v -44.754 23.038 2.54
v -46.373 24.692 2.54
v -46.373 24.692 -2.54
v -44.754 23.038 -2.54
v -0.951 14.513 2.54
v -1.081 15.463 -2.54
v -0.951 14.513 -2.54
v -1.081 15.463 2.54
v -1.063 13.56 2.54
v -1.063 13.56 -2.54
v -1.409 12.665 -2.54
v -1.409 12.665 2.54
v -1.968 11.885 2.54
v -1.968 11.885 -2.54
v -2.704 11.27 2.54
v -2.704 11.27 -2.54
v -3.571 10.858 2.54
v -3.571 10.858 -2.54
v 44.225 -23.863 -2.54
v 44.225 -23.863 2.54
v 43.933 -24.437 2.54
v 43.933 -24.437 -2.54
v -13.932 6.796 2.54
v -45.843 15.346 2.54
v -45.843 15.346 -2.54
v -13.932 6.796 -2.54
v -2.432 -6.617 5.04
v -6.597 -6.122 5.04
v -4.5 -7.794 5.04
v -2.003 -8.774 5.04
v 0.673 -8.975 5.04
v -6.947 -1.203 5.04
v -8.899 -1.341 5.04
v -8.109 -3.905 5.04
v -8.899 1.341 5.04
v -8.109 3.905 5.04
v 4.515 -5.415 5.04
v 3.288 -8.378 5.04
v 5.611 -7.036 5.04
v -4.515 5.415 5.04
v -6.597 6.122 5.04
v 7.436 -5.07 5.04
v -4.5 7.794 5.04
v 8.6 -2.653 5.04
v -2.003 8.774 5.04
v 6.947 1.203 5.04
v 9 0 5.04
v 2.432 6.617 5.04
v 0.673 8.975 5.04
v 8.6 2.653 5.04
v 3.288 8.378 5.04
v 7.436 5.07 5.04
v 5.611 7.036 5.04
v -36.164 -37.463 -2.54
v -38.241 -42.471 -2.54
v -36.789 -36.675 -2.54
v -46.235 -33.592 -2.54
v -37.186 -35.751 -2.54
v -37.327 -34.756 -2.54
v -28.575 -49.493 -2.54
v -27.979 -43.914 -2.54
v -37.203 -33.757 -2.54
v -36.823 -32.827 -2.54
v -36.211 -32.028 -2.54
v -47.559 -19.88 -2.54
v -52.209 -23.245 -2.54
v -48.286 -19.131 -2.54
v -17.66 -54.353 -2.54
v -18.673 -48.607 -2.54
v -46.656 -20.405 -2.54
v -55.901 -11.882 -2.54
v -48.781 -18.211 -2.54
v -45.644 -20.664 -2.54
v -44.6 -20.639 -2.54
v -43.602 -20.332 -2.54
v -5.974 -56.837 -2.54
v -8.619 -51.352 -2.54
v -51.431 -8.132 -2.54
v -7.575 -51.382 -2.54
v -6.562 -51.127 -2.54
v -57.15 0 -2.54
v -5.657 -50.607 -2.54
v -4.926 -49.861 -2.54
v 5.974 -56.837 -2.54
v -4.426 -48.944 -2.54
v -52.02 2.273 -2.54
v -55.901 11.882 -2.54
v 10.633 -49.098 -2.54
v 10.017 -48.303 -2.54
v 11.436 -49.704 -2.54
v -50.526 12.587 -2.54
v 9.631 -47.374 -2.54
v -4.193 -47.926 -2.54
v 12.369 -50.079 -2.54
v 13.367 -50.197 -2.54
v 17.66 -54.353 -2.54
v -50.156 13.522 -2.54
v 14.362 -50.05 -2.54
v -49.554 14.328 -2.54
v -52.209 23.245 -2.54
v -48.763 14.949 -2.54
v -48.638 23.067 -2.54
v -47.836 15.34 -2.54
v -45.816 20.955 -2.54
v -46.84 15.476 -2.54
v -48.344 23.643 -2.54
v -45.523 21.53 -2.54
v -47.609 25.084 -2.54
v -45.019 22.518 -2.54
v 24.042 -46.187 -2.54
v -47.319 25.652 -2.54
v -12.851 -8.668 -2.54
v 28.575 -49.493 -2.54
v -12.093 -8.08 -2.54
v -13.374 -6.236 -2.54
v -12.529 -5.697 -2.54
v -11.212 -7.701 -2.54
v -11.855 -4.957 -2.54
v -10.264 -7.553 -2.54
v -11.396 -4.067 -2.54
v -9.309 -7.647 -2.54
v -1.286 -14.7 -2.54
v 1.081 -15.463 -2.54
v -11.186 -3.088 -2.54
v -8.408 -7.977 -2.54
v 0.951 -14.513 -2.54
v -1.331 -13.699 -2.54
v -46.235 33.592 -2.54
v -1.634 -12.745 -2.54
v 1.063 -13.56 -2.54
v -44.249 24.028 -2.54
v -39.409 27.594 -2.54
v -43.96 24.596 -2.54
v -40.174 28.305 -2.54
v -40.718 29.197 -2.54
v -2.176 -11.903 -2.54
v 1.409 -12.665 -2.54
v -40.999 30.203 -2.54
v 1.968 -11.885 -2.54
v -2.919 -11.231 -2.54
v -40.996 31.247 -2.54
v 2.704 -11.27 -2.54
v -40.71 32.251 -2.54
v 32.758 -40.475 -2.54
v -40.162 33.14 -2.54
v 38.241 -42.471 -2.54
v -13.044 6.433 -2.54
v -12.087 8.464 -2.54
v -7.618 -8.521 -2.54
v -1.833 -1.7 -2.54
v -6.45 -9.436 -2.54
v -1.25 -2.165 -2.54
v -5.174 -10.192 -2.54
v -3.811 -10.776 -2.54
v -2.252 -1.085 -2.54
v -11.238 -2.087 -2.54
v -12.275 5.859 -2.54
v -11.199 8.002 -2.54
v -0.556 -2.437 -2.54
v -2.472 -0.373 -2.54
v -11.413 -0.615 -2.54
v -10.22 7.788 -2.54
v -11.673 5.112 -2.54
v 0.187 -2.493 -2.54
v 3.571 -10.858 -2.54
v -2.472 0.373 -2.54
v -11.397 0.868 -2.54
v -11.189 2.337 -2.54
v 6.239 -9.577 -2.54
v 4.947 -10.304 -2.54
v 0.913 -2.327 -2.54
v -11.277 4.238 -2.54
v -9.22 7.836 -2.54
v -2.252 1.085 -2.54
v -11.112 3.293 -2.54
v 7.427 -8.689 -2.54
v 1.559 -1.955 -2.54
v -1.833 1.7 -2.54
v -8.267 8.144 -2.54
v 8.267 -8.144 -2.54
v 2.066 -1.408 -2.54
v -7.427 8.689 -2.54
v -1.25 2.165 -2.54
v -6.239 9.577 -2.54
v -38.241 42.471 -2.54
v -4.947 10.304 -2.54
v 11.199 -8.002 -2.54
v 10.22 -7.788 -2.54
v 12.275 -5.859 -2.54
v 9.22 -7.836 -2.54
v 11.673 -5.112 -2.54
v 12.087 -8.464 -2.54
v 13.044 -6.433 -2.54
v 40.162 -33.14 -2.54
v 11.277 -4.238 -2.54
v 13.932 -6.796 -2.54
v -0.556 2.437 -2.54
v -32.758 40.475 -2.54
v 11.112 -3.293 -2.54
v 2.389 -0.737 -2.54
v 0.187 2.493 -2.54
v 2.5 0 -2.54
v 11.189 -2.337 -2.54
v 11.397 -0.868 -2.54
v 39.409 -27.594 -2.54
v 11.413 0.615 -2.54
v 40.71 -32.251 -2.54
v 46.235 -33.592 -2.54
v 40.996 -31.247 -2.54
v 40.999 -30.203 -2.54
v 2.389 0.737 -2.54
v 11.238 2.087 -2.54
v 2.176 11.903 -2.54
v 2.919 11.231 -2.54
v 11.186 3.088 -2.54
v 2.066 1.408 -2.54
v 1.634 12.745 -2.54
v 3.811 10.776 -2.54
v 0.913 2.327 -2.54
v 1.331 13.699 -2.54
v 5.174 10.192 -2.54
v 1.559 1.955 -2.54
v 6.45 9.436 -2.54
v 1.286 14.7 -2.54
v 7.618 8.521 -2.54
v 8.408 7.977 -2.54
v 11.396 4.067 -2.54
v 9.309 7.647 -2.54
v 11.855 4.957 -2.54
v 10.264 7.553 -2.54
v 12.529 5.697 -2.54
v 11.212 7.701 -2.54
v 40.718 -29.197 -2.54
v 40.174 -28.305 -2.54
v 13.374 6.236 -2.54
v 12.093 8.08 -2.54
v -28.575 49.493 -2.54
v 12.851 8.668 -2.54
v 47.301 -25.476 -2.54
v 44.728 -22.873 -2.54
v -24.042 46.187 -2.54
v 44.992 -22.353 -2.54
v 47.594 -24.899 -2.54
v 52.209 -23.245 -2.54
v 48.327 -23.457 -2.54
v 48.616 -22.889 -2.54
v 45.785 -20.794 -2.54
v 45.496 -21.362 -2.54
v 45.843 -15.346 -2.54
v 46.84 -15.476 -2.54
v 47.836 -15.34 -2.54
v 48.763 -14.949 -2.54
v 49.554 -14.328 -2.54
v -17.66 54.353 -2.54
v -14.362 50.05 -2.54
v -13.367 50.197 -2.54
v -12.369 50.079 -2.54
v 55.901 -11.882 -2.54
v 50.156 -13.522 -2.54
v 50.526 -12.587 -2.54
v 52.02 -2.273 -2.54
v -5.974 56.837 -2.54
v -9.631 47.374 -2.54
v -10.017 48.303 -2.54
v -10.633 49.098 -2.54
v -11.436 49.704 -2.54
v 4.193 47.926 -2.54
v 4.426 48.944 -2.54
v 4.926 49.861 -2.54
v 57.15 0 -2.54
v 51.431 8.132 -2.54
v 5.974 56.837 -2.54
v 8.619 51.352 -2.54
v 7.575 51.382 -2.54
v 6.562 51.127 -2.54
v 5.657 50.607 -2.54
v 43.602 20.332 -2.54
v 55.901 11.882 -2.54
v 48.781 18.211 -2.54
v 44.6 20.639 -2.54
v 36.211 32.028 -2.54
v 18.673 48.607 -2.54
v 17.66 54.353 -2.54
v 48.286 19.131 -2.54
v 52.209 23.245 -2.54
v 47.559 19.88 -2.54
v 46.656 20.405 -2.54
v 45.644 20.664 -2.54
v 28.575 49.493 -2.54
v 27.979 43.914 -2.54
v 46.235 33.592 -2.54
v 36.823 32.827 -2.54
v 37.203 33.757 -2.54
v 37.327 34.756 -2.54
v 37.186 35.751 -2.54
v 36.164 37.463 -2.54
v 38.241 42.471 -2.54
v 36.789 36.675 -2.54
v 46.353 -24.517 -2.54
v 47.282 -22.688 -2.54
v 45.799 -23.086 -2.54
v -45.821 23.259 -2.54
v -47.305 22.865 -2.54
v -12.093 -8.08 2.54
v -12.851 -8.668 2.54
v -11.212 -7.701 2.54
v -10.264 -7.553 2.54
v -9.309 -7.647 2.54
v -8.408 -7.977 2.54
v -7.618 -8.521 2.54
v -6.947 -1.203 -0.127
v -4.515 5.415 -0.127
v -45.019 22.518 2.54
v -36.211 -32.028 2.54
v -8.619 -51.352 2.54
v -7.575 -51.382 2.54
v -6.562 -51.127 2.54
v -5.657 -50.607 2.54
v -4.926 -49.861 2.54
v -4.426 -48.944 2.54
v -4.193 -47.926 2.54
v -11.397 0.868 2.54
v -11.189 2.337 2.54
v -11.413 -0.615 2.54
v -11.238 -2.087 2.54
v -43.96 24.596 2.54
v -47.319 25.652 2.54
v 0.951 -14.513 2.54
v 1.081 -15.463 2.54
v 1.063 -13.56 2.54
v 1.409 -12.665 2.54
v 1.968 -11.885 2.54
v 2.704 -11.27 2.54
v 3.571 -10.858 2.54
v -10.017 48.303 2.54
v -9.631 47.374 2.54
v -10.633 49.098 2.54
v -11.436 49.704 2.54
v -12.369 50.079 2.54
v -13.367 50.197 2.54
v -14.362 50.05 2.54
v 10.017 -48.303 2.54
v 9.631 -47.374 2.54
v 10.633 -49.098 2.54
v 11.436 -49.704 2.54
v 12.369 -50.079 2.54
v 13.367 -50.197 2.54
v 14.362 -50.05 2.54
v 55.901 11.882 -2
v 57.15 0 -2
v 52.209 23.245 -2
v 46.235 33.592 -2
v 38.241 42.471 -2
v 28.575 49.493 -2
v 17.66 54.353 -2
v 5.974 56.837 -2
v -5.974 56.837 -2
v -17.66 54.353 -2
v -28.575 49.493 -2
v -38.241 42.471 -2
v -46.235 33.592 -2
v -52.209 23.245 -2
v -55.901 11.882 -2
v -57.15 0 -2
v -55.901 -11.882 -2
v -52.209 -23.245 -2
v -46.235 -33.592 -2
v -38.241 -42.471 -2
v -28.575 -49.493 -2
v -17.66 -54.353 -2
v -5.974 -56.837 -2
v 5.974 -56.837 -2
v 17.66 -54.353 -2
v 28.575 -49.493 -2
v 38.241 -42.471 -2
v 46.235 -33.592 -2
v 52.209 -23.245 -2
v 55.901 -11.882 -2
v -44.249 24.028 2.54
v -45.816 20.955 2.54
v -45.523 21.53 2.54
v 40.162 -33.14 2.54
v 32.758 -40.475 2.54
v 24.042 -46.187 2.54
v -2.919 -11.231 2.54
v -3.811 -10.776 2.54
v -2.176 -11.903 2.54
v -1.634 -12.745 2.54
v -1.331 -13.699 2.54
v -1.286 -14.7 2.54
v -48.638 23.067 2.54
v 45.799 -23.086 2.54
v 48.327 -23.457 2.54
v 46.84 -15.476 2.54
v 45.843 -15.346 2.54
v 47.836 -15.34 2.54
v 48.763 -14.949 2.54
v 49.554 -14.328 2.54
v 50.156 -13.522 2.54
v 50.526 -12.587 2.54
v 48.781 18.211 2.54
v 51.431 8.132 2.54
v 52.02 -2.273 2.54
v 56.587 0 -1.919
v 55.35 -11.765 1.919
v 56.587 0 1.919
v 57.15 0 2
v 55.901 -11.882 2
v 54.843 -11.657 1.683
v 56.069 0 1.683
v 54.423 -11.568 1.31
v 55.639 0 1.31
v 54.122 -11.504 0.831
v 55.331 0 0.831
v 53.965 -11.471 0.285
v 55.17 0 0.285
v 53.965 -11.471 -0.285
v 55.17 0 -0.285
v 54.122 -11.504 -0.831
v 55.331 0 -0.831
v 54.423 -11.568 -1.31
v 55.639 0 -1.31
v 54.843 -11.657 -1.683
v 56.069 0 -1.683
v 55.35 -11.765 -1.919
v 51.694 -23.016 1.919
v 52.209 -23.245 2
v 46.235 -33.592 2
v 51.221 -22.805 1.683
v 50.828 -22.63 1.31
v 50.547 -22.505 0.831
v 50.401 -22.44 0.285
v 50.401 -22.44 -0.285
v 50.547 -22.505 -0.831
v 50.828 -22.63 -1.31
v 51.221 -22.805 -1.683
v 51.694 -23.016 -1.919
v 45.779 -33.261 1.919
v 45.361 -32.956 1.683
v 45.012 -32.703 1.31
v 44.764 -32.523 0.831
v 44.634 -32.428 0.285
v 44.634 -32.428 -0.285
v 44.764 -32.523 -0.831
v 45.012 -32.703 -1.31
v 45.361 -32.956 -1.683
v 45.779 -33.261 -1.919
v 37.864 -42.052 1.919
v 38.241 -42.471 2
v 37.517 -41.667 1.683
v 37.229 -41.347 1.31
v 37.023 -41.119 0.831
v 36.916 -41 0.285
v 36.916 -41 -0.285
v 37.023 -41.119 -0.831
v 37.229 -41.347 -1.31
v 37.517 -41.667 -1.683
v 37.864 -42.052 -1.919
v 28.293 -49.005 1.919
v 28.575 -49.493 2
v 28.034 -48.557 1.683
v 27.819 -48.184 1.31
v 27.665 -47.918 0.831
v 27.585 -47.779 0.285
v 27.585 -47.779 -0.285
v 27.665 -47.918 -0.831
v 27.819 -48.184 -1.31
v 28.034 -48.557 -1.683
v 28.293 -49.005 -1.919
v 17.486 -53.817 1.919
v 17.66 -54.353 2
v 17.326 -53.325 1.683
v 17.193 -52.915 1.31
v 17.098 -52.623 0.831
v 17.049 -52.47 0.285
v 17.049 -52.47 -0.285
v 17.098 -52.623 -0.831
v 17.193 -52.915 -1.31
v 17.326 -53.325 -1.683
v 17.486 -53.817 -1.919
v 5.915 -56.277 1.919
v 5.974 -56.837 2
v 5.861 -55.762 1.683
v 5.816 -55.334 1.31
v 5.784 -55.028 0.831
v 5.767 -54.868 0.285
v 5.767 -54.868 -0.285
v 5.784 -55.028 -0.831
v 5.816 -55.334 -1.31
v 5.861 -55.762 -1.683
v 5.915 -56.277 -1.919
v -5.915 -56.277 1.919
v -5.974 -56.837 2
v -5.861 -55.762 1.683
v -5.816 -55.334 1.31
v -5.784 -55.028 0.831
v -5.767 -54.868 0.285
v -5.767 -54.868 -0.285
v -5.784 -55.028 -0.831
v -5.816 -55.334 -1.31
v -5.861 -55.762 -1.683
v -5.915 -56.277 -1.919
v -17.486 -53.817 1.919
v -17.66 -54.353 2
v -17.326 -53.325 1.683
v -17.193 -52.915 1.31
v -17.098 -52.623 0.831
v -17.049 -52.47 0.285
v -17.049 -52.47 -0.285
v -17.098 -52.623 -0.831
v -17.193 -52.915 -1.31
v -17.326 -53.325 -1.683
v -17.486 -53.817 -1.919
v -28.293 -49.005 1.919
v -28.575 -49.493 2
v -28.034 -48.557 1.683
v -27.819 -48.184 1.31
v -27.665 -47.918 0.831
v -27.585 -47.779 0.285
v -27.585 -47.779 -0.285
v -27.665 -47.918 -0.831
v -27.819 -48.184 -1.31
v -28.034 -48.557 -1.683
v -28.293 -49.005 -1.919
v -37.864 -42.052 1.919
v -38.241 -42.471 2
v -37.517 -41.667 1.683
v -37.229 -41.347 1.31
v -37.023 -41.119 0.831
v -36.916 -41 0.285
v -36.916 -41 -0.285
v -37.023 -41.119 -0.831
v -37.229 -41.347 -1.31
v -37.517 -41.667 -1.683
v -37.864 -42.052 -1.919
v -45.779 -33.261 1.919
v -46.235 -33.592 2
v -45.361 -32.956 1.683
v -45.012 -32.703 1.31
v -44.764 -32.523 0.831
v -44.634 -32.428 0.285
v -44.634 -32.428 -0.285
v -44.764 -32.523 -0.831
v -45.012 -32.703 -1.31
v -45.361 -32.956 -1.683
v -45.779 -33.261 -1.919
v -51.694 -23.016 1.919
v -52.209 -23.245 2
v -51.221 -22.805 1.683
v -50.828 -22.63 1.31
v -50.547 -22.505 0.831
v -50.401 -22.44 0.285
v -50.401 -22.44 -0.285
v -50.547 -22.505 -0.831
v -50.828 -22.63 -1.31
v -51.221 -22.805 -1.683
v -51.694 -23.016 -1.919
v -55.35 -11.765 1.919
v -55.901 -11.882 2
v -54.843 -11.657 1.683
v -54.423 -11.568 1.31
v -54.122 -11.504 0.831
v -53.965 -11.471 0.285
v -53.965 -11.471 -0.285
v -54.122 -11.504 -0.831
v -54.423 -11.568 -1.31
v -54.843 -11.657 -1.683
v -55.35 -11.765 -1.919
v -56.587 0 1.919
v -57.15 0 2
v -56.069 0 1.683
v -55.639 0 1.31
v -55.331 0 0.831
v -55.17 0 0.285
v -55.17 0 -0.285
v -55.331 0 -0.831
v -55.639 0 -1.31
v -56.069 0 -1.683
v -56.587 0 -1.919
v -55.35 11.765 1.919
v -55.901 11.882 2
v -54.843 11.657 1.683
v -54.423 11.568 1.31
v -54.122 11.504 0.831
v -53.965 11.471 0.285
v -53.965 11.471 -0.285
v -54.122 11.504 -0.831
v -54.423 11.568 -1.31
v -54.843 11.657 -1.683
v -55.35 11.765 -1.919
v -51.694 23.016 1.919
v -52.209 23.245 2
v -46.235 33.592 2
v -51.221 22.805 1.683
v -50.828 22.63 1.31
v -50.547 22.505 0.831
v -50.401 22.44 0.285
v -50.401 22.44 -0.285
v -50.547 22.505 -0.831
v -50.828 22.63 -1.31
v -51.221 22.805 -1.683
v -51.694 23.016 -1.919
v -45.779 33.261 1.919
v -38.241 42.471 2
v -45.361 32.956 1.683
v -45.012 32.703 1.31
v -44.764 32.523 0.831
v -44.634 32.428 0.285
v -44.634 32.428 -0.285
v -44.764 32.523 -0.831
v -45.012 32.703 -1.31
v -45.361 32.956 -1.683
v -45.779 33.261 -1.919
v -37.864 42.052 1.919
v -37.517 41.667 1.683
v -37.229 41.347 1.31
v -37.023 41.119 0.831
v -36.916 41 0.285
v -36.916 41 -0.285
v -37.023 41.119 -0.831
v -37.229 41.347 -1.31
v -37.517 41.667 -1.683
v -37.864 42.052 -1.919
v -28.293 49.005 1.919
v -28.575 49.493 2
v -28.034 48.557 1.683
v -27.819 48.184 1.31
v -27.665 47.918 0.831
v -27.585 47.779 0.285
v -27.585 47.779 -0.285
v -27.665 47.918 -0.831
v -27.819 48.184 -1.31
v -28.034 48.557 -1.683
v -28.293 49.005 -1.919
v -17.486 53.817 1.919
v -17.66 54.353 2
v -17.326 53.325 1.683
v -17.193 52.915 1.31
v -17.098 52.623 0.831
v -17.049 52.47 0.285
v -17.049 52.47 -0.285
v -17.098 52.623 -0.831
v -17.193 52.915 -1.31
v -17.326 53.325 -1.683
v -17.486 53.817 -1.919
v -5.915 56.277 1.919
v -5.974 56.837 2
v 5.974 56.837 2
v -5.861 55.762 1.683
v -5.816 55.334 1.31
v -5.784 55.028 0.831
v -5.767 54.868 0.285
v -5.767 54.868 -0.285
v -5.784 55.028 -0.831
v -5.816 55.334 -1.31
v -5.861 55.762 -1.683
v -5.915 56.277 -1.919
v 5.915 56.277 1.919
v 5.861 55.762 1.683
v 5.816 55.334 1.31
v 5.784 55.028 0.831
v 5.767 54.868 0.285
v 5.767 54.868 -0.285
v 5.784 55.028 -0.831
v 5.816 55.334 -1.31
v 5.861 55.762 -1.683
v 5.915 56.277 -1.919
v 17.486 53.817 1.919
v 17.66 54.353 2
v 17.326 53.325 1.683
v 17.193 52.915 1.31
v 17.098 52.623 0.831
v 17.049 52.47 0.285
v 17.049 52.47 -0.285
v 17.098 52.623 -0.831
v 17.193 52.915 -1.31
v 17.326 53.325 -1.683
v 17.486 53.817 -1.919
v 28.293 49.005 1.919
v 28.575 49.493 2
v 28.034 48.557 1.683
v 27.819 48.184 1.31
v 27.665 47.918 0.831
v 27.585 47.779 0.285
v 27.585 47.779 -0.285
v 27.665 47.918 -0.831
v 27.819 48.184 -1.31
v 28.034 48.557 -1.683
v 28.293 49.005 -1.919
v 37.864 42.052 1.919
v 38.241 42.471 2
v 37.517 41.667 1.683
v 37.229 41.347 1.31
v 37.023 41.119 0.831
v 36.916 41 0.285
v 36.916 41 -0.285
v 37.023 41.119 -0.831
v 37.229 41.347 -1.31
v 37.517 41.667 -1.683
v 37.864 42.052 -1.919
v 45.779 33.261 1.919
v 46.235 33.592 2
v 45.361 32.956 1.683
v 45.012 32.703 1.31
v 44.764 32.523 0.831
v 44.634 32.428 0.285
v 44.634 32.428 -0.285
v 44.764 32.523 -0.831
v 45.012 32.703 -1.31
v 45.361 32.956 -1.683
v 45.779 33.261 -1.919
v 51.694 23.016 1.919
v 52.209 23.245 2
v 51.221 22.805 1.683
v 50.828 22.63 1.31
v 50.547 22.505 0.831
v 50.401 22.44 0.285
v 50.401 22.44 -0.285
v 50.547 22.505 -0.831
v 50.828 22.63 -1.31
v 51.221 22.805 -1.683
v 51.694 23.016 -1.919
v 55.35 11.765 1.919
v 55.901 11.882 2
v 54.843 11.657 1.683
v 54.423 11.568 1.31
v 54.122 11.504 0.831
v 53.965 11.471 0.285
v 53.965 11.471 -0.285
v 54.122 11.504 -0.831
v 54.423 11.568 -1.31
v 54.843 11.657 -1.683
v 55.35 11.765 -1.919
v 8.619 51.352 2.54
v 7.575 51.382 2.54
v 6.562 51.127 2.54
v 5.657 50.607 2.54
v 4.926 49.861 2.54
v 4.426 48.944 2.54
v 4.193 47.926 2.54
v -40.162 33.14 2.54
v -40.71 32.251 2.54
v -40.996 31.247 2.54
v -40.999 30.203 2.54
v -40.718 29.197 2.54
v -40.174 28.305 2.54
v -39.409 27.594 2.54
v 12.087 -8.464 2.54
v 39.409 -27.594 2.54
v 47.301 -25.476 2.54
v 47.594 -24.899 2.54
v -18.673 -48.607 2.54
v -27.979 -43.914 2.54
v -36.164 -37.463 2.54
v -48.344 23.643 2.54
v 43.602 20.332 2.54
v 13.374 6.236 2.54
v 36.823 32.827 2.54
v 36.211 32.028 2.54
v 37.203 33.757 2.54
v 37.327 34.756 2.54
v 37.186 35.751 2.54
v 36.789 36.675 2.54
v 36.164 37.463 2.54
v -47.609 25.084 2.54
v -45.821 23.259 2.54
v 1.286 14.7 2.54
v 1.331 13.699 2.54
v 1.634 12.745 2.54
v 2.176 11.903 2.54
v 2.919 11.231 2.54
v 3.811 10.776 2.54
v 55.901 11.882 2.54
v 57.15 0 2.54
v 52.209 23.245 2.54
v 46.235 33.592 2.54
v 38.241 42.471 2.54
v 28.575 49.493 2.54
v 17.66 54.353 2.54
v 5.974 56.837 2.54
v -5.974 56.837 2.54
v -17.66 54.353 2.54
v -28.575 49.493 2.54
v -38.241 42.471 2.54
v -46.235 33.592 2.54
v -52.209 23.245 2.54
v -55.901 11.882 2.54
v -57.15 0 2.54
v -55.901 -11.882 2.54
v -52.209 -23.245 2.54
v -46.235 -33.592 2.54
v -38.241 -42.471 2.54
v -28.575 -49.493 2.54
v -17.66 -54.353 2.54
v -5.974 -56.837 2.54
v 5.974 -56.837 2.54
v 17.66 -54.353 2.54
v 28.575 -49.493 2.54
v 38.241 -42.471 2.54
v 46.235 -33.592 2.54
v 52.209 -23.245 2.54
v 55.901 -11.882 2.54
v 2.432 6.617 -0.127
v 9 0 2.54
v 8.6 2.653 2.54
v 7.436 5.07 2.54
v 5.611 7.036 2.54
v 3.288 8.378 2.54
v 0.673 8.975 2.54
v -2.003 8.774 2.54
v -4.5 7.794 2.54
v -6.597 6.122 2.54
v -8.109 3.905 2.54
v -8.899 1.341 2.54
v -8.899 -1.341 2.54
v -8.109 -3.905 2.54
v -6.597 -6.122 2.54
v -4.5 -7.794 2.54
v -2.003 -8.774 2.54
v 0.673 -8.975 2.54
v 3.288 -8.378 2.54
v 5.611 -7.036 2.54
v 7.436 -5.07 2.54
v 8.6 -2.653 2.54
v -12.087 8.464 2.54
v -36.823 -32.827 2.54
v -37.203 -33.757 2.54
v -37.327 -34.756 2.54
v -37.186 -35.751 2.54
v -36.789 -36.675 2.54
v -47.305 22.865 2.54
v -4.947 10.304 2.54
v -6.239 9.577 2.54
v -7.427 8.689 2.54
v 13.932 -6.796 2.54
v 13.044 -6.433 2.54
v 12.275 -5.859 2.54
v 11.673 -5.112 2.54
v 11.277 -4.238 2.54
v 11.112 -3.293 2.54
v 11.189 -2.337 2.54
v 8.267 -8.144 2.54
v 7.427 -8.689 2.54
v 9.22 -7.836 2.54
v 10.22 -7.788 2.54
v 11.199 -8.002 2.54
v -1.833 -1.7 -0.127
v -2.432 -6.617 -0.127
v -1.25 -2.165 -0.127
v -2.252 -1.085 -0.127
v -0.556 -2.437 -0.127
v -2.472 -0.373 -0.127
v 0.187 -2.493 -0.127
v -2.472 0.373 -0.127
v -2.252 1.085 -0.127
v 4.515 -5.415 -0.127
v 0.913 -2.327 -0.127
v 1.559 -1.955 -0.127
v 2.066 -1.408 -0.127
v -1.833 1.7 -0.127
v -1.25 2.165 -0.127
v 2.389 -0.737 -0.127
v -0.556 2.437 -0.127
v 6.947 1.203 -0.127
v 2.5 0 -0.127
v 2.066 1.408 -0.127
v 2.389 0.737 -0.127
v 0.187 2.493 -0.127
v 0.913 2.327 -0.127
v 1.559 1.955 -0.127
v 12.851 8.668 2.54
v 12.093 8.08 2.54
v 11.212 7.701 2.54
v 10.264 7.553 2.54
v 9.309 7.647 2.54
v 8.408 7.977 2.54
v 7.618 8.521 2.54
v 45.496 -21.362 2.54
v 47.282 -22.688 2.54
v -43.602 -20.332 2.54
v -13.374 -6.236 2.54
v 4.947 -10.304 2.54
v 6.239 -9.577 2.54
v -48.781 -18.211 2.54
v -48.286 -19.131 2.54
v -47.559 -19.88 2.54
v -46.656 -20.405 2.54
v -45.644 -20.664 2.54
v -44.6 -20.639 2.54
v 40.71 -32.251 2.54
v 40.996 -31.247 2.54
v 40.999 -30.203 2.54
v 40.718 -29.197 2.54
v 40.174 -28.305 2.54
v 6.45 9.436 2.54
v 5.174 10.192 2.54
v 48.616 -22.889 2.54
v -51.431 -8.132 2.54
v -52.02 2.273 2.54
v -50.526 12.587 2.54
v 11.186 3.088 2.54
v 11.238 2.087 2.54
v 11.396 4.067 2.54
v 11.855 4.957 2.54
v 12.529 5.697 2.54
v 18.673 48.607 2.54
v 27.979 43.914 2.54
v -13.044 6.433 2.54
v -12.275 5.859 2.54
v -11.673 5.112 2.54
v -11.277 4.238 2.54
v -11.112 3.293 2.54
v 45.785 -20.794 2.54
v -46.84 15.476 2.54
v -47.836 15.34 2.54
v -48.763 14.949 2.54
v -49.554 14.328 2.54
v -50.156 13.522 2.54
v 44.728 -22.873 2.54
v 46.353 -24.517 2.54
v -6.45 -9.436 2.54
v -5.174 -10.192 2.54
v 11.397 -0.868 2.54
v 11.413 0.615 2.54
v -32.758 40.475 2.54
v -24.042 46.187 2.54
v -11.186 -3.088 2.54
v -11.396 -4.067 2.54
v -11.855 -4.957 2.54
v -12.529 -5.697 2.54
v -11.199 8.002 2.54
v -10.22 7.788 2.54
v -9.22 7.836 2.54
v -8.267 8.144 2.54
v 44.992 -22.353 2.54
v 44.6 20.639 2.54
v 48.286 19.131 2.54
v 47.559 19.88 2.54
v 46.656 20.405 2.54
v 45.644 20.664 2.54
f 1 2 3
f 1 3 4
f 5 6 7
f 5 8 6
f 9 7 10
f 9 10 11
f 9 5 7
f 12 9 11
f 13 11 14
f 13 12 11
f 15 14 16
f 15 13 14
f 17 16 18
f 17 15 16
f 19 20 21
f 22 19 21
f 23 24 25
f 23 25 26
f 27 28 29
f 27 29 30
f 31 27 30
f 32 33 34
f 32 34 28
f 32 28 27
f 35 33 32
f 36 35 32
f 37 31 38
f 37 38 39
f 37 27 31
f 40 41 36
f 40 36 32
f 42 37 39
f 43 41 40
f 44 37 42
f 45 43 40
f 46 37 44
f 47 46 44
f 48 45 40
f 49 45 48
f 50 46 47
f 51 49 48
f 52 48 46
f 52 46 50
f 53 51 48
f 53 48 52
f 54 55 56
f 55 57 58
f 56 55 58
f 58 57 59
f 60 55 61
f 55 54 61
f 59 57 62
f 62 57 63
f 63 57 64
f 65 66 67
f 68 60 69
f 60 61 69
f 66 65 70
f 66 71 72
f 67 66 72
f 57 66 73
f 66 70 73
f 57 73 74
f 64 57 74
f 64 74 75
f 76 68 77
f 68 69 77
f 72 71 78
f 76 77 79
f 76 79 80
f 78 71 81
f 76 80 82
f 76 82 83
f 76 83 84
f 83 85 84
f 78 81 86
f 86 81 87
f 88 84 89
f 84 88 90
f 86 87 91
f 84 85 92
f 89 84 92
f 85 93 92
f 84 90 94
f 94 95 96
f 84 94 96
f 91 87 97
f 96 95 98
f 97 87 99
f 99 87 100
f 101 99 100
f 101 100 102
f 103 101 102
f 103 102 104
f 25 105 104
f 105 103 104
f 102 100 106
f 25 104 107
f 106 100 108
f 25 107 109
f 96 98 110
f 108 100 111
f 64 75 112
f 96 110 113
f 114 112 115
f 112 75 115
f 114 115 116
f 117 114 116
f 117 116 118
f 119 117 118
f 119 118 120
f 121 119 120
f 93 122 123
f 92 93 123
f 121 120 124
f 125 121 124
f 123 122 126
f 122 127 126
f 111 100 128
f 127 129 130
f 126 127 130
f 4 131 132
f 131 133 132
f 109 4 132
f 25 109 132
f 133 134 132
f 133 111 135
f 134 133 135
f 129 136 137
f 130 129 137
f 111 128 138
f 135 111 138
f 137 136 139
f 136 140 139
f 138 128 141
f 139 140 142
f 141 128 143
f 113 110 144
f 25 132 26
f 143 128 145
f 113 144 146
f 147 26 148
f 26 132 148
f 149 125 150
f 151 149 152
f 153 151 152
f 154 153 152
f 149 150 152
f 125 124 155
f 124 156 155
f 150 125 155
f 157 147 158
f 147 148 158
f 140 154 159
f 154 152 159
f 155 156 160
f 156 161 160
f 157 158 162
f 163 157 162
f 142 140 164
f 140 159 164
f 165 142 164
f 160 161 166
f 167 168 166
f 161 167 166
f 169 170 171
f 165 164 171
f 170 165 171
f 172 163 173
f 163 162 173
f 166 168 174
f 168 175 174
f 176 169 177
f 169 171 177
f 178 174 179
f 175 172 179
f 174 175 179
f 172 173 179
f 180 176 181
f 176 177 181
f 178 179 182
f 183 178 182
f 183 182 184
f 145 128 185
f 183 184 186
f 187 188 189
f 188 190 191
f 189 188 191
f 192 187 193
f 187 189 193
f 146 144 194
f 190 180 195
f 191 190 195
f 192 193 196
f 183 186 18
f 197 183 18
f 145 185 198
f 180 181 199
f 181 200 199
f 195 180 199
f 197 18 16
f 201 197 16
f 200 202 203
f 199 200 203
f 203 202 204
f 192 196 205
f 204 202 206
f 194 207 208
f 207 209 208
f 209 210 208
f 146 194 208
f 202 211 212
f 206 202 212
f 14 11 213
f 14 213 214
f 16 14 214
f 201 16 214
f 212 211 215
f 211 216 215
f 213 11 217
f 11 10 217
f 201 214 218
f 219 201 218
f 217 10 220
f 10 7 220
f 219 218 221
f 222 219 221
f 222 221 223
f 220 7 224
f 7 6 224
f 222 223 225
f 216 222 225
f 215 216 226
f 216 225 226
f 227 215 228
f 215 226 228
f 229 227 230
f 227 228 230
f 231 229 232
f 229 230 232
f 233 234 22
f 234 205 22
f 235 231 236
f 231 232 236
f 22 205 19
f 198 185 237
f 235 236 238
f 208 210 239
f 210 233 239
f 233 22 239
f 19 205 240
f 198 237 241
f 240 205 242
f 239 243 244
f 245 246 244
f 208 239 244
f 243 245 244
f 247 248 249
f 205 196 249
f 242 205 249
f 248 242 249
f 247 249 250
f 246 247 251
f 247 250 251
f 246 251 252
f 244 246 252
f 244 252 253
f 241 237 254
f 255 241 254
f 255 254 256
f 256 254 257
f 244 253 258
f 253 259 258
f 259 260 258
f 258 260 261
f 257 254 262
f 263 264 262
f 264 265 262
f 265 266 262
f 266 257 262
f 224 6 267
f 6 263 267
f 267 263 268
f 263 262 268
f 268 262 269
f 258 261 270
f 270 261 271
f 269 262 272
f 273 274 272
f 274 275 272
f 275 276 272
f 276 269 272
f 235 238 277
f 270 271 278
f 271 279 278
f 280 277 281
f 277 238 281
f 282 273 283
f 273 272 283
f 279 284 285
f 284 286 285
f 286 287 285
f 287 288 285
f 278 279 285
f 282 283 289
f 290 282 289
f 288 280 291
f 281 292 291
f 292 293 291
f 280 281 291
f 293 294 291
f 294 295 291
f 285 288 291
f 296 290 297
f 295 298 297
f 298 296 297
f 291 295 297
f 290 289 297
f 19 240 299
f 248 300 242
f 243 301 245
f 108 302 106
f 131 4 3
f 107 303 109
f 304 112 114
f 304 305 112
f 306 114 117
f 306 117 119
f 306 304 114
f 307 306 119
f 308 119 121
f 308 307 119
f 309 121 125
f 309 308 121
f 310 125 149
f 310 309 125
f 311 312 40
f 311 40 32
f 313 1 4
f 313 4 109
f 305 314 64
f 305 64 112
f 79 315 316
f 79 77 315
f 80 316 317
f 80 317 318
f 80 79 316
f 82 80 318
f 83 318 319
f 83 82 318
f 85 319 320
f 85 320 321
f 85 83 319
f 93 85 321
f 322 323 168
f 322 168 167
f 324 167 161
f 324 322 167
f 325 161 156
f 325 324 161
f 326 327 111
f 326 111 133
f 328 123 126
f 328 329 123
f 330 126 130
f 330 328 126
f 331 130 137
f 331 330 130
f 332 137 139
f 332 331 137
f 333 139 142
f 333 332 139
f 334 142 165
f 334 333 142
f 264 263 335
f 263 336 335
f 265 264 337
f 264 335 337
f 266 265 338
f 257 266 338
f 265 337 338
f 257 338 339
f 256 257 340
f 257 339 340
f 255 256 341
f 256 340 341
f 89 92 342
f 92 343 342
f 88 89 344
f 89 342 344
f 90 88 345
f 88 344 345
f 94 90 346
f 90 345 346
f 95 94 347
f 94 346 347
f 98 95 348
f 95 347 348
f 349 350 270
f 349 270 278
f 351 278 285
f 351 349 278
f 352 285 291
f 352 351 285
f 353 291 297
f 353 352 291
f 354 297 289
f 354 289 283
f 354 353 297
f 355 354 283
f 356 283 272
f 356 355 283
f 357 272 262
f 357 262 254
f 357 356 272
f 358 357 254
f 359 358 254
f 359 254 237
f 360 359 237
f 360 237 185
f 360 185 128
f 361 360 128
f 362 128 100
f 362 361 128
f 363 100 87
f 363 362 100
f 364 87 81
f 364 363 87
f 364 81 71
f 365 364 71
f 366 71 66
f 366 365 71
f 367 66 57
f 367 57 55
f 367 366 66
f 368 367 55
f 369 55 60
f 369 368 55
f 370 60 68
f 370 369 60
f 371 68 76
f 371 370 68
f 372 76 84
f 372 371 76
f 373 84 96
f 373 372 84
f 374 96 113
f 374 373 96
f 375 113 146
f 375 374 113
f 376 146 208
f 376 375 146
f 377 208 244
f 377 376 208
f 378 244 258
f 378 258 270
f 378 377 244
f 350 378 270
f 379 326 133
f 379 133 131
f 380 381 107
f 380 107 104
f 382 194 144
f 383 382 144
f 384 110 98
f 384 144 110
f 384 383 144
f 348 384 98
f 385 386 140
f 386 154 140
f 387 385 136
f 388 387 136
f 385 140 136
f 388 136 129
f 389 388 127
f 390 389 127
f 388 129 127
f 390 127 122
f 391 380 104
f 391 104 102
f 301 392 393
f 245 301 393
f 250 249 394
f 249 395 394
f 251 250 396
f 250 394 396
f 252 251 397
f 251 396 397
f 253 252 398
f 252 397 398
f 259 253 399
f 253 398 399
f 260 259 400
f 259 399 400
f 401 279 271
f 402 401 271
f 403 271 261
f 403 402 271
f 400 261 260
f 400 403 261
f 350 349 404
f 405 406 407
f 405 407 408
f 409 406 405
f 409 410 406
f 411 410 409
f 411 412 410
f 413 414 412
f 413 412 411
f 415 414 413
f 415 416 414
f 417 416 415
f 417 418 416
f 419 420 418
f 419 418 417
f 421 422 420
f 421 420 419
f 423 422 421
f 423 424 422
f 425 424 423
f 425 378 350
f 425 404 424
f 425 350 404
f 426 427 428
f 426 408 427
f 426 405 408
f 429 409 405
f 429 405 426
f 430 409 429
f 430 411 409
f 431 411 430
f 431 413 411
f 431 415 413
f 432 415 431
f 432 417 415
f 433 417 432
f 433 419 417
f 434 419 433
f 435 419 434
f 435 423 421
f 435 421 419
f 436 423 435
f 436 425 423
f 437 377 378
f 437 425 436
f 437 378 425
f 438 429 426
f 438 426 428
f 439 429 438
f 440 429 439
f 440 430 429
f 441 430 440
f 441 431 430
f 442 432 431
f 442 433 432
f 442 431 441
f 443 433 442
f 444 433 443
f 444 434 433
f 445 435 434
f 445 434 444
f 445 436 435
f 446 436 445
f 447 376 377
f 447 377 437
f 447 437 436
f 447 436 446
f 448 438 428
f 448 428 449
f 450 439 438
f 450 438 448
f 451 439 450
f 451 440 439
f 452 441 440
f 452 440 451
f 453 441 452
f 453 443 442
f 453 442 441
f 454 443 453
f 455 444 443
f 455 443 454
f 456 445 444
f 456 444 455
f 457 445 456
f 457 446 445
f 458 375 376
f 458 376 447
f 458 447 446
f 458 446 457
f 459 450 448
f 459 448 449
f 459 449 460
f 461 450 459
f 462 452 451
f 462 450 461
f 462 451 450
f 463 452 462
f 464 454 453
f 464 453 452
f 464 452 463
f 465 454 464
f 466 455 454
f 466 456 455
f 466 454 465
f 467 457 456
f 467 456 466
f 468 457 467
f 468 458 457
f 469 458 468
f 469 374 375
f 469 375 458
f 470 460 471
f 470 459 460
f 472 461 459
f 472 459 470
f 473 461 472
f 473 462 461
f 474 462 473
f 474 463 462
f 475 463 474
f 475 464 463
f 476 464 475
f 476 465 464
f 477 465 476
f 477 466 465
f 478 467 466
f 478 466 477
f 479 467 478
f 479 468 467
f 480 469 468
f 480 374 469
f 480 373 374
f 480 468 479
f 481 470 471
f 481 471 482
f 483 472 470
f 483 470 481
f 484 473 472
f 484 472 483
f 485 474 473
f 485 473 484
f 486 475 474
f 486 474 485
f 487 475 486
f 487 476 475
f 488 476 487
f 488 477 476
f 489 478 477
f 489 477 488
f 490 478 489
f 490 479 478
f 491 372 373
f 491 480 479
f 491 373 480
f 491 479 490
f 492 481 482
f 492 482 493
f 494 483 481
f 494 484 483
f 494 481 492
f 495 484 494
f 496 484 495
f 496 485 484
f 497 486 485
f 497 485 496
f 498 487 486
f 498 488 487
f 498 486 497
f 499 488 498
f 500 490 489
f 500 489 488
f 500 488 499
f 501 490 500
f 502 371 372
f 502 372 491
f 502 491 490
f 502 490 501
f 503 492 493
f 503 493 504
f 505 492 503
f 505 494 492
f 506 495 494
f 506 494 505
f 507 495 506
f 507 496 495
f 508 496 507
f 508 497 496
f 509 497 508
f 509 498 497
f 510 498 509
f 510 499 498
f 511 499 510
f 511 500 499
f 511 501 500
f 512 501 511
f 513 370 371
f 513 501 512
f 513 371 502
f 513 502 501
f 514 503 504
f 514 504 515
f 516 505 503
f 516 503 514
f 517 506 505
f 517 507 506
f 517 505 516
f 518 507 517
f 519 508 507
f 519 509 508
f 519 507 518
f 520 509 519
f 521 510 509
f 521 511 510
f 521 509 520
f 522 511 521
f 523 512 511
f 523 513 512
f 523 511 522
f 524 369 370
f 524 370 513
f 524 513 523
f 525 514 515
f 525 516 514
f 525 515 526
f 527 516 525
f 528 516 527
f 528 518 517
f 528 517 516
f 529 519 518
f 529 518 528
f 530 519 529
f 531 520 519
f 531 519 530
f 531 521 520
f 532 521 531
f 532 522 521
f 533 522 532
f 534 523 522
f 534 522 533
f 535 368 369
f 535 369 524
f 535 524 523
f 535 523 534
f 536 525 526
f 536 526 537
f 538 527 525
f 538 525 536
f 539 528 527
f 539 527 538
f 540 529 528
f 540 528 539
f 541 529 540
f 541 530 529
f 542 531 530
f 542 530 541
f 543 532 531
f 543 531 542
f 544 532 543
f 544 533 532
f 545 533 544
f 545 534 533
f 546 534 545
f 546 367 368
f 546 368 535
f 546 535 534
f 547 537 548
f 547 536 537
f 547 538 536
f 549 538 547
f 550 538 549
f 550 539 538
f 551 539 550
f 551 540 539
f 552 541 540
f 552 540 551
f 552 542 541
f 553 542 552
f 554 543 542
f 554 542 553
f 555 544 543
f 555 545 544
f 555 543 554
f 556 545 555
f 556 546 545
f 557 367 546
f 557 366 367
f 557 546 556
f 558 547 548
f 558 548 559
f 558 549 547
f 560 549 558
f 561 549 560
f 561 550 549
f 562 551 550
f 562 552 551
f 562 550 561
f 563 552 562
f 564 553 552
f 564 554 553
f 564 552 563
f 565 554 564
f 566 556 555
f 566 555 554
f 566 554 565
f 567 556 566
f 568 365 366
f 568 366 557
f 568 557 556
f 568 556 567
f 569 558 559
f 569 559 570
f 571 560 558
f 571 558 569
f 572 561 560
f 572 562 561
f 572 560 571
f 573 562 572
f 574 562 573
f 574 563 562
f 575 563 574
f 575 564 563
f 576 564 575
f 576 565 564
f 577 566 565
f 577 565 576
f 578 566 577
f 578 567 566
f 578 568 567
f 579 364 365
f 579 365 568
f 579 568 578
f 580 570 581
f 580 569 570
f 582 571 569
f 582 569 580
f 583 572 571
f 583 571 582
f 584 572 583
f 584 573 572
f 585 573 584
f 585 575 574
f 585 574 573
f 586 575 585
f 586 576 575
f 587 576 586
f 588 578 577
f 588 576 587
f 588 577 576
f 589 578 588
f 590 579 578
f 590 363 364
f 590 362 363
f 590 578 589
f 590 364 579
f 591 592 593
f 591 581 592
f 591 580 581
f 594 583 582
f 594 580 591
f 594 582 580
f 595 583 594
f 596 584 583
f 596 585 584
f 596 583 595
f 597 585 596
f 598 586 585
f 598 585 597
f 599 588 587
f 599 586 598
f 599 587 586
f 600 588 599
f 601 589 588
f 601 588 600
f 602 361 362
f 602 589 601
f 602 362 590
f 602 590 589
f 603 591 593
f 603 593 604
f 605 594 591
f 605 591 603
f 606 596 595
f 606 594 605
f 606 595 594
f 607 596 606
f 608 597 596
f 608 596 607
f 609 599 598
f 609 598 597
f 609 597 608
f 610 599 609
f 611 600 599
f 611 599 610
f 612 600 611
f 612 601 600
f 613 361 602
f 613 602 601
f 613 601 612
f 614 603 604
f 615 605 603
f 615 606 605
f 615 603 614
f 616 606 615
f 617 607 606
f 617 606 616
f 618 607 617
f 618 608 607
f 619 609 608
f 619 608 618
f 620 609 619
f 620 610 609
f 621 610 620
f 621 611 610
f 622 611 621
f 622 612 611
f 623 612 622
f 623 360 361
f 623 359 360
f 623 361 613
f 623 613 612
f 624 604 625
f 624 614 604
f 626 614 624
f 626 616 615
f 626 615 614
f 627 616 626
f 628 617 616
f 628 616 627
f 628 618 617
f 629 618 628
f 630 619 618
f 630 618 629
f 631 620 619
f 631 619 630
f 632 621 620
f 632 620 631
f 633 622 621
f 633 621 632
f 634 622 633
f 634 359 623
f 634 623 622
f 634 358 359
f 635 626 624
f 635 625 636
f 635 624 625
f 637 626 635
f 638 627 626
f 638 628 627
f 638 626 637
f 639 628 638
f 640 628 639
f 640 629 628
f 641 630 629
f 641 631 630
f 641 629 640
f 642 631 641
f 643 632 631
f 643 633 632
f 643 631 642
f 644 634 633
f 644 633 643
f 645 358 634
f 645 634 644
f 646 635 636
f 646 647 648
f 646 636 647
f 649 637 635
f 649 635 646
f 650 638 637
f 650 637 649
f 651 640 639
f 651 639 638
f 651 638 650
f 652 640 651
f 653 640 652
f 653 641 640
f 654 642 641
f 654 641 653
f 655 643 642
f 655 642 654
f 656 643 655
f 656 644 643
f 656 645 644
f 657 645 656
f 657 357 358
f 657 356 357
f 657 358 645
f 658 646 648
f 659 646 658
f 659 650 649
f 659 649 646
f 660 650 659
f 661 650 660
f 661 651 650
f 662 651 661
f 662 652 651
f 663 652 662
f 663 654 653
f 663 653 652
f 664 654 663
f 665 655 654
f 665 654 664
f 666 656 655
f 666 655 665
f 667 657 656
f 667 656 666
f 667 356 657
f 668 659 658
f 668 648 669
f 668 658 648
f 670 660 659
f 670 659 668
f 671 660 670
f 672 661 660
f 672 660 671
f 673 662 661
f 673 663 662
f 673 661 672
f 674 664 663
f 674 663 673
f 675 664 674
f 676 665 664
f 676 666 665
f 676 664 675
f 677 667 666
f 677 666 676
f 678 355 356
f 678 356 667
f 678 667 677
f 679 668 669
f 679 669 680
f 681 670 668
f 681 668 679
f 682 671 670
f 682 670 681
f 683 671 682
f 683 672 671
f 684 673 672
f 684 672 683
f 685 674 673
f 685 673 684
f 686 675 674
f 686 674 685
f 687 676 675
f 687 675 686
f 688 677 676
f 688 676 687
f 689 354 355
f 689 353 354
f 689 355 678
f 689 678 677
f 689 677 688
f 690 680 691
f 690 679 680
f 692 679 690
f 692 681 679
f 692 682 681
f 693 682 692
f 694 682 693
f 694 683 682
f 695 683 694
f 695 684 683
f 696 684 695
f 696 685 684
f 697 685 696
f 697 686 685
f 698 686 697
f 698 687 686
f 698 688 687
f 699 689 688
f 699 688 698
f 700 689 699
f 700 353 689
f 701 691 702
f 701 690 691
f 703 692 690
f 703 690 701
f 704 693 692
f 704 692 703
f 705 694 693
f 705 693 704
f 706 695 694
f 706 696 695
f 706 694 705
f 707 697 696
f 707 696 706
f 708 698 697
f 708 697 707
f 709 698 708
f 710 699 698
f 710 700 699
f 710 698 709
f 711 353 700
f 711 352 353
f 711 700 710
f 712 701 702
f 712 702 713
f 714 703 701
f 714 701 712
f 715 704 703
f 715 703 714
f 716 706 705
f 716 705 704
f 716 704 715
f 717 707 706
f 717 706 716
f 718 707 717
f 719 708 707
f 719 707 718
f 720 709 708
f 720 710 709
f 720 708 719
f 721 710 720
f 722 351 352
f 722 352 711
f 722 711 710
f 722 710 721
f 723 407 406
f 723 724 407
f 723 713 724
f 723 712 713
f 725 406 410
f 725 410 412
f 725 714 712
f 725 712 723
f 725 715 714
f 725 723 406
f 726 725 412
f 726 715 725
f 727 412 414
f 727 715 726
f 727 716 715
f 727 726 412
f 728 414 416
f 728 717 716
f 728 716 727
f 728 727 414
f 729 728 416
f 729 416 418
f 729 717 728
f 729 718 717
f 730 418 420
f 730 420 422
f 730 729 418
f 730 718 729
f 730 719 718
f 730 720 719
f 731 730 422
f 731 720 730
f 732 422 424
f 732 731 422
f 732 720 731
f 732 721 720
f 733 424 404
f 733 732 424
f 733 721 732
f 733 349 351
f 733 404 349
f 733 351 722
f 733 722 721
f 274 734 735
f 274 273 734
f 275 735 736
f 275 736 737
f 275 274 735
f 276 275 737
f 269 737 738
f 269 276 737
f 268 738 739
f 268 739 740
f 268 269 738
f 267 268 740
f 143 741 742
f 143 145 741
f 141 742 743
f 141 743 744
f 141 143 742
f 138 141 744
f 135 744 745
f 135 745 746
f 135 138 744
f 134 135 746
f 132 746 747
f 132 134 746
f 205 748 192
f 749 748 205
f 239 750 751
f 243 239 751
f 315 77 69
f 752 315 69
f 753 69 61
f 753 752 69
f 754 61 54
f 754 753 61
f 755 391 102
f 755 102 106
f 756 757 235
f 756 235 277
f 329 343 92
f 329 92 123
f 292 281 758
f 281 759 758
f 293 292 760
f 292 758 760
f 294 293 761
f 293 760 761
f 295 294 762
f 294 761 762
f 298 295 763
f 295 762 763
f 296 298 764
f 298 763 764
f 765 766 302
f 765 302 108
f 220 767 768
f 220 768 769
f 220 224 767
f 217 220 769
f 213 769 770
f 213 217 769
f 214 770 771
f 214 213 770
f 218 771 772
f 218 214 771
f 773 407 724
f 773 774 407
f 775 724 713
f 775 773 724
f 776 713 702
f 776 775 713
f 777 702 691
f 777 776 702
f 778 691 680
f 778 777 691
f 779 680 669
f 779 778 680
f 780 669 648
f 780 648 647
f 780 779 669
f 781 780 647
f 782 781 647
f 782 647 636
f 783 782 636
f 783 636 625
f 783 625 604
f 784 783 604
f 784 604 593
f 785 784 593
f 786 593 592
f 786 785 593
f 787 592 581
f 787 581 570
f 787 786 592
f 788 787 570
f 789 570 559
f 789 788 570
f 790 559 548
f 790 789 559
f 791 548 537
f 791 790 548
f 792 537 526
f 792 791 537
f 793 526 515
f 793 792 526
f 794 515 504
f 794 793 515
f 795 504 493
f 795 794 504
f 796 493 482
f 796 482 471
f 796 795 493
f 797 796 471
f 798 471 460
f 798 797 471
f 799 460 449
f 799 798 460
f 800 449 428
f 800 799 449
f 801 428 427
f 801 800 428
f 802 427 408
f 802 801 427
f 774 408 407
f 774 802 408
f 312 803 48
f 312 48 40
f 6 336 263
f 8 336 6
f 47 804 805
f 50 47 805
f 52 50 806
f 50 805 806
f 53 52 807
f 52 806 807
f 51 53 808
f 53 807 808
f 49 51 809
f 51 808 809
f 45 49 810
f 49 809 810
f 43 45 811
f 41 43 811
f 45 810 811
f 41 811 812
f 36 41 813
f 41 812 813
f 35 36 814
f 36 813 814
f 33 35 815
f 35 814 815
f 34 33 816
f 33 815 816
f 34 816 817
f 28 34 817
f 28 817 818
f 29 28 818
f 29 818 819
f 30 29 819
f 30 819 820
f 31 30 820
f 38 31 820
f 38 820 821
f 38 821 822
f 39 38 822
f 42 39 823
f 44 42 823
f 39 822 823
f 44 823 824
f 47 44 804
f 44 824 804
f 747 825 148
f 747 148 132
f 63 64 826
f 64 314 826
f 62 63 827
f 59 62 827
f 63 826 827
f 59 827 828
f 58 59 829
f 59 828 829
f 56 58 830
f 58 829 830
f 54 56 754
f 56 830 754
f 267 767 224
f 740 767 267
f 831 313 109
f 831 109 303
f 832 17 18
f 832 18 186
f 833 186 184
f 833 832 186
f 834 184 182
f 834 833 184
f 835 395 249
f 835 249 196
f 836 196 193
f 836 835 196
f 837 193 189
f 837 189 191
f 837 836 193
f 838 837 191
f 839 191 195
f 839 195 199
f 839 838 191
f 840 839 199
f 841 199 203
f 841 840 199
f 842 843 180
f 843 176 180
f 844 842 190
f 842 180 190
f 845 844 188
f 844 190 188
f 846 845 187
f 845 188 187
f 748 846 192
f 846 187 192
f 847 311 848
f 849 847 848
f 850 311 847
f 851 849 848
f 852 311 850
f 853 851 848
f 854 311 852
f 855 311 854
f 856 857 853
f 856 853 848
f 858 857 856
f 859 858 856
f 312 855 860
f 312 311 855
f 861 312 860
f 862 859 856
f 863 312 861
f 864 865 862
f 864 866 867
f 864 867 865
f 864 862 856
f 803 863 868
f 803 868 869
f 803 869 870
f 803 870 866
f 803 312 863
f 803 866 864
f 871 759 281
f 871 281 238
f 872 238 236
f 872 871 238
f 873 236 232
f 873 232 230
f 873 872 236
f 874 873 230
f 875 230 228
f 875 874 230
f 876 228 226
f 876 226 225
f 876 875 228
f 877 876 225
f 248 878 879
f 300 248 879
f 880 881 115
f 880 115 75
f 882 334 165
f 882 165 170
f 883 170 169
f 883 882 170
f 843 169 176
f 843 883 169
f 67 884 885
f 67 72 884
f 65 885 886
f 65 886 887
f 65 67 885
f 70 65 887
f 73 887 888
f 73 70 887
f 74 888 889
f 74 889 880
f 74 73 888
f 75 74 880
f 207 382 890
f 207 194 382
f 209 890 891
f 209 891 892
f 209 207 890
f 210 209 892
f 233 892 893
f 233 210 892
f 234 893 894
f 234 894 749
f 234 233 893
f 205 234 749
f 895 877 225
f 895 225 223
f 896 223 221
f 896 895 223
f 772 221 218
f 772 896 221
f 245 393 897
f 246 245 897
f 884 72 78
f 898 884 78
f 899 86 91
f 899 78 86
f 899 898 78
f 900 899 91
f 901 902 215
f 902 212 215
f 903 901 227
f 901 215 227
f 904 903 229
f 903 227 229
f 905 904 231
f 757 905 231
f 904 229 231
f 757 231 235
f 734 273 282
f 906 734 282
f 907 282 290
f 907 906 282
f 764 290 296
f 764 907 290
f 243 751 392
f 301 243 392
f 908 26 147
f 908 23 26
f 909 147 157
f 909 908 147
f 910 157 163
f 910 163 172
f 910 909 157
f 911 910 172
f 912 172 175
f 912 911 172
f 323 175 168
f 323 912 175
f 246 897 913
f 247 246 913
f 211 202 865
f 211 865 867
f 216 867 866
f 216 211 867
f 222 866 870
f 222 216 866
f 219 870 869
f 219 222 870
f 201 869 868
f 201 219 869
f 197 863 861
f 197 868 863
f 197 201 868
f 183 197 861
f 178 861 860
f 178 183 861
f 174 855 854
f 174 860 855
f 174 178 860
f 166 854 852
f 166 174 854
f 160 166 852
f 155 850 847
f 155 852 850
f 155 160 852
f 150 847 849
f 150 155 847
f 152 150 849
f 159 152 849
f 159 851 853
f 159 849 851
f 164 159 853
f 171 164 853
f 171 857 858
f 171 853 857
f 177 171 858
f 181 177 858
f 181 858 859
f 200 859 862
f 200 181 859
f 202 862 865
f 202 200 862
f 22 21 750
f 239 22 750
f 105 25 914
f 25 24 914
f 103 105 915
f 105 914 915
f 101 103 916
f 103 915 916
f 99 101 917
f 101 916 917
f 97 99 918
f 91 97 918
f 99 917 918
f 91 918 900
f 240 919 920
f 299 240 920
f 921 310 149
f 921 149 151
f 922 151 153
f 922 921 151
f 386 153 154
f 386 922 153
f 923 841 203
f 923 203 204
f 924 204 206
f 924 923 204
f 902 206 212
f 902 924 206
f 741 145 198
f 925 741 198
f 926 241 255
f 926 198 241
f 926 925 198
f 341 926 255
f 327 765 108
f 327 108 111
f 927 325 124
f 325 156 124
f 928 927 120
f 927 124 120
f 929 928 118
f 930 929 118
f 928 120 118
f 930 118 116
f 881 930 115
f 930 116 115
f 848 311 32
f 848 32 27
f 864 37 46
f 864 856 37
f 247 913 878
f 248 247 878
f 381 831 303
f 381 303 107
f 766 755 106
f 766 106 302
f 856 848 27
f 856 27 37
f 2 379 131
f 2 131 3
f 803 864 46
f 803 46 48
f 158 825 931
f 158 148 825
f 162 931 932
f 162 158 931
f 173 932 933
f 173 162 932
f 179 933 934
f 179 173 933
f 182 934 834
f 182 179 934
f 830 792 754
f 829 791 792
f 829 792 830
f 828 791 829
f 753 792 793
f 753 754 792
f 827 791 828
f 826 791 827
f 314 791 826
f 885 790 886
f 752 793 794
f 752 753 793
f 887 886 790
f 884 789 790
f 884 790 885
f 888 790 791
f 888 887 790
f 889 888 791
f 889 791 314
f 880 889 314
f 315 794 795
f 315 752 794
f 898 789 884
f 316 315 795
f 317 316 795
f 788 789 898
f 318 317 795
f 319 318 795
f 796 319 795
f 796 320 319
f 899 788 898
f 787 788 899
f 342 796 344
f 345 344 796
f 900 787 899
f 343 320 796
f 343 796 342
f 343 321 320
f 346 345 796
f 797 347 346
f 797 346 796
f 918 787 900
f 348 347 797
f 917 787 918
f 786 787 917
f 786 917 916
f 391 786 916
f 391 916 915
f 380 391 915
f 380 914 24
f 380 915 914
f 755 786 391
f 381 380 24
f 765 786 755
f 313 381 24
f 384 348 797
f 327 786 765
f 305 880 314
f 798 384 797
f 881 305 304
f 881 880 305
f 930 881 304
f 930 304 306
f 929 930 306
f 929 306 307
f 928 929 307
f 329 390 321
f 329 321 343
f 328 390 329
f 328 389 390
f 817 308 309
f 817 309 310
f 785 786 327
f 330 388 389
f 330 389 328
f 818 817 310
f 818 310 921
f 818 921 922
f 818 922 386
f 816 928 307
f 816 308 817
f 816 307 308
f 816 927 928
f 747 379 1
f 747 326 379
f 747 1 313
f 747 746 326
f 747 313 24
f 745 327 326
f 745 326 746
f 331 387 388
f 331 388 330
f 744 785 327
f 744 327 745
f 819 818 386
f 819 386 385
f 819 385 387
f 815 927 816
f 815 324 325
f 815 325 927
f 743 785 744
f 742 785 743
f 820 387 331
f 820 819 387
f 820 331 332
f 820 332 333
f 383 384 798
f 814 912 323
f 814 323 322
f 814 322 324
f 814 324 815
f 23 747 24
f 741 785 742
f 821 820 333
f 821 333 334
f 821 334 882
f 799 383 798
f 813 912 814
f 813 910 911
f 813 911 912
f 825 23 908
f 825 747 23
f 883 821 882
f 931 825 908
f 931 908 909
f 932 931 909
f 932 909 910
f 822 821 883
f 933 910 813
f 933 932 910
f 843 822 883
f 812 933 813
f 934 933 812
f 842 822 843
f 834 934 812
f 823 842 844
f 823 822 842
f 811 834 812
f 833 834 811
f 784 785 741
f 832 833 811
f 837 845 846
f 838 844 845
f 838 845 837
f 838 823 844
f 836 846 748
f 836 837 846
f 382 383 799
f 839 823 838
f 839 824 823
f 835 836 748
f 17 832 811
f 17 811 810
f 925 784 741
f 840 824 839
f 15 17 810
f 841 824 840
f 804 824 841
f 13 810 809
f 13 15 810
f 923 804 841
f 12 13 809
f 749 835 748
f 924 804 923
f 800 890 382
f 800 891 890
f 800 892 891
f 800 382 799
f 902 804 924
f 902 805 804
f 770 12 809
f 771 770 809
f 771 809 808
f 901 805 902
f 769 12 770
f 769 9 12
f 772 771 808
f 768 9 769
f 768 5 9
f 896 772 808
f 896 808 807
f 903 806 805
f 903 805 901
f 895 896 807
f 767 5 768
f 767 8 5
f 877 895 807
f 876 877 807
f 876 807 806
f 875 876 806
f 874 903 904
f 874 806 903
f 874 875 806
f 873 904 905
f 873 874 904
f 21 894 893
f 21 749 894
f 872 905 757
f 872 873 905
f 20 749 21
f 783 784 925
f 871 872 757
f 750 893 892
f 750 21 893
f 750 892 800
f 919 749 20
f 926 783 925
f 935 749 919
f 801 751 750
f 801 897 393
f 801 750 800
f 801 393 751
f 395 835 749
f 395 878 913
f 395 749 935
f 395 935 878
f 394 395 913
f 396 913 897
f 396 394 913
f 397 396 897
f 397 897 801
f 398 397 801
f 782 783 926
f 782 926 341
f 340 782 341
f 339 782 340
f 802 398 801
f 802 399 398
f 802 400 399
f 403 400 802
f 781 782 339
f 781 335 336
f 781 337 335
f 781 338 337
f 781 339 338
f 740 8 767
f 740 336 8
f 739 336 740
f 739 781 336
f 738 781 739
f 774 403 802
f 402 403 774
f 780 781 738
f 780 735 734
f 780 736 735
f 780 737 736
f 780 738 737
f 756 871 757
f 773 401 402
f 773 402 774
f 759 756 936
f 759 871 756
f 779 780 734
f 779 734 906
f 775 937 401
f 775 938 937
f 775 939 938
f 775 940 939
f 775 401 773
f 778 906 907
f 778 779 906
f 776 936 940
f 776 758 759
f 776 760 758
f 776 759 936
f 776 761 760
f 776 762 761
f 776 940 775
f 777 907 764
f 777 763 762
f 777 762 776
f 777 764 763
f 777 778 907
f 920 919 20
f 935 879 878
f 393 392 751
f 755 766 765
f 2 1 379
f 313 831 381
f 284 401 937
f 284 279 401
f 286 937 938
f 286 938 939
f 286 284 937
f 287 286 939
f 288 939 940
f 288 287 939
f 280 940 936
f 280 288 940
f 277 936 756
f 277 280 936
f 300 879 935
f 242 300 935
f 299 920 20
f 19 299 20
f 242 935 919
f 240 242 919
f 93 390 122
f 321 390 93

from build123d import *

# Parameters (mm, degrees)
SKETCH1_R                = 57.15
BOSS_EXTRUDE3_DEPTH      = 2.54
CUT_EXTRUDE1_DEPTH       = 81.98179672
FILLET1_R                = 3.81
CIRPATTERN1_COUNT        = 6
FILLET1_OF_CIRPATTERN1_R = 3.81
CUT_EXTRUDE2_DEPTH       = 81.98179672
CUT_EXTRUDE2_DEPTH_BACK  = 81.98179672
SKETCH4_R                = 2.5
CUT_EXTRUDE3_DEPTH       = 2.667
SKETCH5_3_R              = 9
BOSS_EXTRUDE9_DEPTH      = 2.5
SKETCH11_R               = 2
CUT_EXTRUDE4_DEPTH       = 81.98179672


with BuildPart() as part:
    # Sketch1 → Boss-Extrude3 (new, symmetric)
    with BuildSketch(Plane.XY):
        Circle(SKETCH1_R)
    extrude(amount=BOSS_EXTRUDE3_DEPTH, both=True)

    # Sketch3 → Cut-Extrude1 (cut, symmetric)
    with BuildSketch(Plane.XY.offset(2.54)):
        with BuildLine():
            ThreePointArc((-10.597439882, 50.980184071), (-28.641923541, 43.48476878), (-42.653246946, 29.866125041))
            Line((-42.653246946, 29.866125041), (-9.362907866, 6.555978667))
            ThreePointArc((-9.362907866, 6.555978667), (-5.277786649, 10.138533823), (0, 11.43))
            Line((0, 11.43), (-10.597439882, 50.980184071))
        make_face()
    cut_extrude1 = extrude(amount=CUT_EXTRUDE1_DEPTH, both=True, mode=Mode.SUBTRACT)

    # Fillet1
    fillet1_edges = [part.edges().sort_by_distance(p)[0] for p in [
        (-9.362907866, 6.555978667, 0),
        (-42.653246946, 29.866125041, 0),
        (0, 11.43, 0),
        (-10.597439882, 50.980184071, 0),
    ]]
    fillet(fillet1_edges, radius=FILLET1_R)

    # CirPattern1: Cut-Extrude1 ×6 about axis
    cirpattern1_axis = Axis((0, 0, 2.54), (0, 0, -1))
    for i in range(1, CIRPATTERN1_COUNT):
        add(cut_extrude1.rotate(cirpattern1_axis, i * 360 / CIRPATTERN1_COUNT), mode=Mode.SUBTRACT)

    # Fillet1 of CirPattern1
    fillet1_of_cirpattern1_edges = [part.edges().sort_by_distance(p)[0] for p in [
        (0.99619014, 11.386505399, 0),
        (4.538199525, 51.87185793, 0),
        (9.898670365, 5.715, 0),
        (38.851414554, 34.667744189, 0),
        (10.359098006, 4.830526732, 0),
        (47.191446471, 22.005732889, 0),
        (9.898670365, -5.715, 0),
        (49.448854437, -16.312439882, 0),
        (9.362907866, -6.555978667, 0),
        (42.653246946, -29.866125041, 0),
        (0, -11.43, 0),
        (10.597439882, -50.980184071, 0),
        (-0.99619014, -11.386505399, 0),
        (-4.538199525, -51.87185793, 0),
        (-9.898670365, -5.715, 0),
        (-38.851414554, -34.667744189, 0),
        (-10.359098006, -4.830526732, 0),
        (-47.191446471, -22.005732889, 0),
        (-9.898670365, 5.715, 0),
        (-49.448854437, 16.312439882, 0),
    ]]
    fillet(fillet1_of_cirpattern1_edges, radius=FILLET1_OF_CIRPATTERN1_R)

    # Sketch4 → Cut-Extrude2 (cut, two sides: drawn at the far end of the back side and taken through both)
    with BuildSketch(Plane.XY.offset(2.54).offset(-CUT_EXTRUDE2_DEPTH_BACK)):
        Circle(SKETCH4_R)
    extrude(amount=CUT_EXTRUDE2_DEPTH + CUT_EXTRUDE2_DEPTH_BACK, mode=Mode.SUBTRACT)

    # Sketch5 → Cut-Extrude3 (cut, symmetric)
    with BuildSketch(Plane.XY.offset(2.54)):
        Polygon((4.515050808, -5.41450055), (6.946620429, 1.202898424), (2.431569621, 6.617398974), (-4.515050808, 5.41450055), (-6.946620429, -1.202898424), (-2.431569621, -6.617398974), align=None)
    extrude(amount=CUT_EXTRUDE3_DEPTH, both=True, mode=Mode.SUBTRACT)

    # Sketch5<3> → Boss-Extrude9 (add)
    with BuildSketch(Plane.XY.offset(2.54)):
        Circle(SKETCH5_3_R)
        Polygon((4.515050808, -5.41450055), (6.946620429, 1.202898424), (2.431569621, 6.617398974), (-4.515050808, 5.41450055), (-6.946620429, -1.202898424), (-2.431569621, -6.617398974), align=None, mode=Mode.SUBTRACT)
    extrude(amount=BOSS_EXTRUDE9_DEPTH)

    # Sketch11 → Cut-Revolve1 (revolve, cut)
    with BuildSketch(Plane(origin=(0, 0, 0), x_dir=(0, 0, -1), z_dir=(1, 0, 0))):
        with Locations((0, 57.15)):
            Circle(SKETCH11_R)
    revolve(axis=Axis((0, 0, 5.04), (0, 0, -1)), mode=Mode.SUBTRACT)

    # Sketch12 → Cut-Extrude4 (cut, through all)
    with BuildSketch(Plane.XY.offset(2.54)):
        Polygon((-48.637599982, 23.067154966), (-48.34382995, 23.643477082), (-45.821193732, 23.258561216), (-47.609054309, 25.08428237), (-47.319491007, 25.652191024), (-43.959715366, 24.596301601), (-44.249278668, 24.028392947), (-46.372976584, 24.692355287), (-44.75408636, 23.037707851), (-45.019110398, 22.518176601), (-47.30476745, 22.864530768), (-45.523216969, 21.52959487), (-45.815584757, 20.95537612), align=None)
        Polygon((47.301176757, -25.475850915), (47.59425656, -24.899177488), (45.798508906, -23.086129205), (48.326749768, -23.45721049), (48.615502847, -22.888889451), (45.784622613, -20.793868703), (45.495869534, -21.362189742), (47.282457589, -22.688478531), (44.991967867, -22.353335985), (44.727887152, -22.873347367), (46.352998071, -24.517489655), (44.225273466, -23.862688943), (43.933069043, -24.436990843), align=None)
    extrude(amount=-CUT_EXTRUDE4_DEPTH, mode=Mode.SUBTRACT)


solid = part.part
